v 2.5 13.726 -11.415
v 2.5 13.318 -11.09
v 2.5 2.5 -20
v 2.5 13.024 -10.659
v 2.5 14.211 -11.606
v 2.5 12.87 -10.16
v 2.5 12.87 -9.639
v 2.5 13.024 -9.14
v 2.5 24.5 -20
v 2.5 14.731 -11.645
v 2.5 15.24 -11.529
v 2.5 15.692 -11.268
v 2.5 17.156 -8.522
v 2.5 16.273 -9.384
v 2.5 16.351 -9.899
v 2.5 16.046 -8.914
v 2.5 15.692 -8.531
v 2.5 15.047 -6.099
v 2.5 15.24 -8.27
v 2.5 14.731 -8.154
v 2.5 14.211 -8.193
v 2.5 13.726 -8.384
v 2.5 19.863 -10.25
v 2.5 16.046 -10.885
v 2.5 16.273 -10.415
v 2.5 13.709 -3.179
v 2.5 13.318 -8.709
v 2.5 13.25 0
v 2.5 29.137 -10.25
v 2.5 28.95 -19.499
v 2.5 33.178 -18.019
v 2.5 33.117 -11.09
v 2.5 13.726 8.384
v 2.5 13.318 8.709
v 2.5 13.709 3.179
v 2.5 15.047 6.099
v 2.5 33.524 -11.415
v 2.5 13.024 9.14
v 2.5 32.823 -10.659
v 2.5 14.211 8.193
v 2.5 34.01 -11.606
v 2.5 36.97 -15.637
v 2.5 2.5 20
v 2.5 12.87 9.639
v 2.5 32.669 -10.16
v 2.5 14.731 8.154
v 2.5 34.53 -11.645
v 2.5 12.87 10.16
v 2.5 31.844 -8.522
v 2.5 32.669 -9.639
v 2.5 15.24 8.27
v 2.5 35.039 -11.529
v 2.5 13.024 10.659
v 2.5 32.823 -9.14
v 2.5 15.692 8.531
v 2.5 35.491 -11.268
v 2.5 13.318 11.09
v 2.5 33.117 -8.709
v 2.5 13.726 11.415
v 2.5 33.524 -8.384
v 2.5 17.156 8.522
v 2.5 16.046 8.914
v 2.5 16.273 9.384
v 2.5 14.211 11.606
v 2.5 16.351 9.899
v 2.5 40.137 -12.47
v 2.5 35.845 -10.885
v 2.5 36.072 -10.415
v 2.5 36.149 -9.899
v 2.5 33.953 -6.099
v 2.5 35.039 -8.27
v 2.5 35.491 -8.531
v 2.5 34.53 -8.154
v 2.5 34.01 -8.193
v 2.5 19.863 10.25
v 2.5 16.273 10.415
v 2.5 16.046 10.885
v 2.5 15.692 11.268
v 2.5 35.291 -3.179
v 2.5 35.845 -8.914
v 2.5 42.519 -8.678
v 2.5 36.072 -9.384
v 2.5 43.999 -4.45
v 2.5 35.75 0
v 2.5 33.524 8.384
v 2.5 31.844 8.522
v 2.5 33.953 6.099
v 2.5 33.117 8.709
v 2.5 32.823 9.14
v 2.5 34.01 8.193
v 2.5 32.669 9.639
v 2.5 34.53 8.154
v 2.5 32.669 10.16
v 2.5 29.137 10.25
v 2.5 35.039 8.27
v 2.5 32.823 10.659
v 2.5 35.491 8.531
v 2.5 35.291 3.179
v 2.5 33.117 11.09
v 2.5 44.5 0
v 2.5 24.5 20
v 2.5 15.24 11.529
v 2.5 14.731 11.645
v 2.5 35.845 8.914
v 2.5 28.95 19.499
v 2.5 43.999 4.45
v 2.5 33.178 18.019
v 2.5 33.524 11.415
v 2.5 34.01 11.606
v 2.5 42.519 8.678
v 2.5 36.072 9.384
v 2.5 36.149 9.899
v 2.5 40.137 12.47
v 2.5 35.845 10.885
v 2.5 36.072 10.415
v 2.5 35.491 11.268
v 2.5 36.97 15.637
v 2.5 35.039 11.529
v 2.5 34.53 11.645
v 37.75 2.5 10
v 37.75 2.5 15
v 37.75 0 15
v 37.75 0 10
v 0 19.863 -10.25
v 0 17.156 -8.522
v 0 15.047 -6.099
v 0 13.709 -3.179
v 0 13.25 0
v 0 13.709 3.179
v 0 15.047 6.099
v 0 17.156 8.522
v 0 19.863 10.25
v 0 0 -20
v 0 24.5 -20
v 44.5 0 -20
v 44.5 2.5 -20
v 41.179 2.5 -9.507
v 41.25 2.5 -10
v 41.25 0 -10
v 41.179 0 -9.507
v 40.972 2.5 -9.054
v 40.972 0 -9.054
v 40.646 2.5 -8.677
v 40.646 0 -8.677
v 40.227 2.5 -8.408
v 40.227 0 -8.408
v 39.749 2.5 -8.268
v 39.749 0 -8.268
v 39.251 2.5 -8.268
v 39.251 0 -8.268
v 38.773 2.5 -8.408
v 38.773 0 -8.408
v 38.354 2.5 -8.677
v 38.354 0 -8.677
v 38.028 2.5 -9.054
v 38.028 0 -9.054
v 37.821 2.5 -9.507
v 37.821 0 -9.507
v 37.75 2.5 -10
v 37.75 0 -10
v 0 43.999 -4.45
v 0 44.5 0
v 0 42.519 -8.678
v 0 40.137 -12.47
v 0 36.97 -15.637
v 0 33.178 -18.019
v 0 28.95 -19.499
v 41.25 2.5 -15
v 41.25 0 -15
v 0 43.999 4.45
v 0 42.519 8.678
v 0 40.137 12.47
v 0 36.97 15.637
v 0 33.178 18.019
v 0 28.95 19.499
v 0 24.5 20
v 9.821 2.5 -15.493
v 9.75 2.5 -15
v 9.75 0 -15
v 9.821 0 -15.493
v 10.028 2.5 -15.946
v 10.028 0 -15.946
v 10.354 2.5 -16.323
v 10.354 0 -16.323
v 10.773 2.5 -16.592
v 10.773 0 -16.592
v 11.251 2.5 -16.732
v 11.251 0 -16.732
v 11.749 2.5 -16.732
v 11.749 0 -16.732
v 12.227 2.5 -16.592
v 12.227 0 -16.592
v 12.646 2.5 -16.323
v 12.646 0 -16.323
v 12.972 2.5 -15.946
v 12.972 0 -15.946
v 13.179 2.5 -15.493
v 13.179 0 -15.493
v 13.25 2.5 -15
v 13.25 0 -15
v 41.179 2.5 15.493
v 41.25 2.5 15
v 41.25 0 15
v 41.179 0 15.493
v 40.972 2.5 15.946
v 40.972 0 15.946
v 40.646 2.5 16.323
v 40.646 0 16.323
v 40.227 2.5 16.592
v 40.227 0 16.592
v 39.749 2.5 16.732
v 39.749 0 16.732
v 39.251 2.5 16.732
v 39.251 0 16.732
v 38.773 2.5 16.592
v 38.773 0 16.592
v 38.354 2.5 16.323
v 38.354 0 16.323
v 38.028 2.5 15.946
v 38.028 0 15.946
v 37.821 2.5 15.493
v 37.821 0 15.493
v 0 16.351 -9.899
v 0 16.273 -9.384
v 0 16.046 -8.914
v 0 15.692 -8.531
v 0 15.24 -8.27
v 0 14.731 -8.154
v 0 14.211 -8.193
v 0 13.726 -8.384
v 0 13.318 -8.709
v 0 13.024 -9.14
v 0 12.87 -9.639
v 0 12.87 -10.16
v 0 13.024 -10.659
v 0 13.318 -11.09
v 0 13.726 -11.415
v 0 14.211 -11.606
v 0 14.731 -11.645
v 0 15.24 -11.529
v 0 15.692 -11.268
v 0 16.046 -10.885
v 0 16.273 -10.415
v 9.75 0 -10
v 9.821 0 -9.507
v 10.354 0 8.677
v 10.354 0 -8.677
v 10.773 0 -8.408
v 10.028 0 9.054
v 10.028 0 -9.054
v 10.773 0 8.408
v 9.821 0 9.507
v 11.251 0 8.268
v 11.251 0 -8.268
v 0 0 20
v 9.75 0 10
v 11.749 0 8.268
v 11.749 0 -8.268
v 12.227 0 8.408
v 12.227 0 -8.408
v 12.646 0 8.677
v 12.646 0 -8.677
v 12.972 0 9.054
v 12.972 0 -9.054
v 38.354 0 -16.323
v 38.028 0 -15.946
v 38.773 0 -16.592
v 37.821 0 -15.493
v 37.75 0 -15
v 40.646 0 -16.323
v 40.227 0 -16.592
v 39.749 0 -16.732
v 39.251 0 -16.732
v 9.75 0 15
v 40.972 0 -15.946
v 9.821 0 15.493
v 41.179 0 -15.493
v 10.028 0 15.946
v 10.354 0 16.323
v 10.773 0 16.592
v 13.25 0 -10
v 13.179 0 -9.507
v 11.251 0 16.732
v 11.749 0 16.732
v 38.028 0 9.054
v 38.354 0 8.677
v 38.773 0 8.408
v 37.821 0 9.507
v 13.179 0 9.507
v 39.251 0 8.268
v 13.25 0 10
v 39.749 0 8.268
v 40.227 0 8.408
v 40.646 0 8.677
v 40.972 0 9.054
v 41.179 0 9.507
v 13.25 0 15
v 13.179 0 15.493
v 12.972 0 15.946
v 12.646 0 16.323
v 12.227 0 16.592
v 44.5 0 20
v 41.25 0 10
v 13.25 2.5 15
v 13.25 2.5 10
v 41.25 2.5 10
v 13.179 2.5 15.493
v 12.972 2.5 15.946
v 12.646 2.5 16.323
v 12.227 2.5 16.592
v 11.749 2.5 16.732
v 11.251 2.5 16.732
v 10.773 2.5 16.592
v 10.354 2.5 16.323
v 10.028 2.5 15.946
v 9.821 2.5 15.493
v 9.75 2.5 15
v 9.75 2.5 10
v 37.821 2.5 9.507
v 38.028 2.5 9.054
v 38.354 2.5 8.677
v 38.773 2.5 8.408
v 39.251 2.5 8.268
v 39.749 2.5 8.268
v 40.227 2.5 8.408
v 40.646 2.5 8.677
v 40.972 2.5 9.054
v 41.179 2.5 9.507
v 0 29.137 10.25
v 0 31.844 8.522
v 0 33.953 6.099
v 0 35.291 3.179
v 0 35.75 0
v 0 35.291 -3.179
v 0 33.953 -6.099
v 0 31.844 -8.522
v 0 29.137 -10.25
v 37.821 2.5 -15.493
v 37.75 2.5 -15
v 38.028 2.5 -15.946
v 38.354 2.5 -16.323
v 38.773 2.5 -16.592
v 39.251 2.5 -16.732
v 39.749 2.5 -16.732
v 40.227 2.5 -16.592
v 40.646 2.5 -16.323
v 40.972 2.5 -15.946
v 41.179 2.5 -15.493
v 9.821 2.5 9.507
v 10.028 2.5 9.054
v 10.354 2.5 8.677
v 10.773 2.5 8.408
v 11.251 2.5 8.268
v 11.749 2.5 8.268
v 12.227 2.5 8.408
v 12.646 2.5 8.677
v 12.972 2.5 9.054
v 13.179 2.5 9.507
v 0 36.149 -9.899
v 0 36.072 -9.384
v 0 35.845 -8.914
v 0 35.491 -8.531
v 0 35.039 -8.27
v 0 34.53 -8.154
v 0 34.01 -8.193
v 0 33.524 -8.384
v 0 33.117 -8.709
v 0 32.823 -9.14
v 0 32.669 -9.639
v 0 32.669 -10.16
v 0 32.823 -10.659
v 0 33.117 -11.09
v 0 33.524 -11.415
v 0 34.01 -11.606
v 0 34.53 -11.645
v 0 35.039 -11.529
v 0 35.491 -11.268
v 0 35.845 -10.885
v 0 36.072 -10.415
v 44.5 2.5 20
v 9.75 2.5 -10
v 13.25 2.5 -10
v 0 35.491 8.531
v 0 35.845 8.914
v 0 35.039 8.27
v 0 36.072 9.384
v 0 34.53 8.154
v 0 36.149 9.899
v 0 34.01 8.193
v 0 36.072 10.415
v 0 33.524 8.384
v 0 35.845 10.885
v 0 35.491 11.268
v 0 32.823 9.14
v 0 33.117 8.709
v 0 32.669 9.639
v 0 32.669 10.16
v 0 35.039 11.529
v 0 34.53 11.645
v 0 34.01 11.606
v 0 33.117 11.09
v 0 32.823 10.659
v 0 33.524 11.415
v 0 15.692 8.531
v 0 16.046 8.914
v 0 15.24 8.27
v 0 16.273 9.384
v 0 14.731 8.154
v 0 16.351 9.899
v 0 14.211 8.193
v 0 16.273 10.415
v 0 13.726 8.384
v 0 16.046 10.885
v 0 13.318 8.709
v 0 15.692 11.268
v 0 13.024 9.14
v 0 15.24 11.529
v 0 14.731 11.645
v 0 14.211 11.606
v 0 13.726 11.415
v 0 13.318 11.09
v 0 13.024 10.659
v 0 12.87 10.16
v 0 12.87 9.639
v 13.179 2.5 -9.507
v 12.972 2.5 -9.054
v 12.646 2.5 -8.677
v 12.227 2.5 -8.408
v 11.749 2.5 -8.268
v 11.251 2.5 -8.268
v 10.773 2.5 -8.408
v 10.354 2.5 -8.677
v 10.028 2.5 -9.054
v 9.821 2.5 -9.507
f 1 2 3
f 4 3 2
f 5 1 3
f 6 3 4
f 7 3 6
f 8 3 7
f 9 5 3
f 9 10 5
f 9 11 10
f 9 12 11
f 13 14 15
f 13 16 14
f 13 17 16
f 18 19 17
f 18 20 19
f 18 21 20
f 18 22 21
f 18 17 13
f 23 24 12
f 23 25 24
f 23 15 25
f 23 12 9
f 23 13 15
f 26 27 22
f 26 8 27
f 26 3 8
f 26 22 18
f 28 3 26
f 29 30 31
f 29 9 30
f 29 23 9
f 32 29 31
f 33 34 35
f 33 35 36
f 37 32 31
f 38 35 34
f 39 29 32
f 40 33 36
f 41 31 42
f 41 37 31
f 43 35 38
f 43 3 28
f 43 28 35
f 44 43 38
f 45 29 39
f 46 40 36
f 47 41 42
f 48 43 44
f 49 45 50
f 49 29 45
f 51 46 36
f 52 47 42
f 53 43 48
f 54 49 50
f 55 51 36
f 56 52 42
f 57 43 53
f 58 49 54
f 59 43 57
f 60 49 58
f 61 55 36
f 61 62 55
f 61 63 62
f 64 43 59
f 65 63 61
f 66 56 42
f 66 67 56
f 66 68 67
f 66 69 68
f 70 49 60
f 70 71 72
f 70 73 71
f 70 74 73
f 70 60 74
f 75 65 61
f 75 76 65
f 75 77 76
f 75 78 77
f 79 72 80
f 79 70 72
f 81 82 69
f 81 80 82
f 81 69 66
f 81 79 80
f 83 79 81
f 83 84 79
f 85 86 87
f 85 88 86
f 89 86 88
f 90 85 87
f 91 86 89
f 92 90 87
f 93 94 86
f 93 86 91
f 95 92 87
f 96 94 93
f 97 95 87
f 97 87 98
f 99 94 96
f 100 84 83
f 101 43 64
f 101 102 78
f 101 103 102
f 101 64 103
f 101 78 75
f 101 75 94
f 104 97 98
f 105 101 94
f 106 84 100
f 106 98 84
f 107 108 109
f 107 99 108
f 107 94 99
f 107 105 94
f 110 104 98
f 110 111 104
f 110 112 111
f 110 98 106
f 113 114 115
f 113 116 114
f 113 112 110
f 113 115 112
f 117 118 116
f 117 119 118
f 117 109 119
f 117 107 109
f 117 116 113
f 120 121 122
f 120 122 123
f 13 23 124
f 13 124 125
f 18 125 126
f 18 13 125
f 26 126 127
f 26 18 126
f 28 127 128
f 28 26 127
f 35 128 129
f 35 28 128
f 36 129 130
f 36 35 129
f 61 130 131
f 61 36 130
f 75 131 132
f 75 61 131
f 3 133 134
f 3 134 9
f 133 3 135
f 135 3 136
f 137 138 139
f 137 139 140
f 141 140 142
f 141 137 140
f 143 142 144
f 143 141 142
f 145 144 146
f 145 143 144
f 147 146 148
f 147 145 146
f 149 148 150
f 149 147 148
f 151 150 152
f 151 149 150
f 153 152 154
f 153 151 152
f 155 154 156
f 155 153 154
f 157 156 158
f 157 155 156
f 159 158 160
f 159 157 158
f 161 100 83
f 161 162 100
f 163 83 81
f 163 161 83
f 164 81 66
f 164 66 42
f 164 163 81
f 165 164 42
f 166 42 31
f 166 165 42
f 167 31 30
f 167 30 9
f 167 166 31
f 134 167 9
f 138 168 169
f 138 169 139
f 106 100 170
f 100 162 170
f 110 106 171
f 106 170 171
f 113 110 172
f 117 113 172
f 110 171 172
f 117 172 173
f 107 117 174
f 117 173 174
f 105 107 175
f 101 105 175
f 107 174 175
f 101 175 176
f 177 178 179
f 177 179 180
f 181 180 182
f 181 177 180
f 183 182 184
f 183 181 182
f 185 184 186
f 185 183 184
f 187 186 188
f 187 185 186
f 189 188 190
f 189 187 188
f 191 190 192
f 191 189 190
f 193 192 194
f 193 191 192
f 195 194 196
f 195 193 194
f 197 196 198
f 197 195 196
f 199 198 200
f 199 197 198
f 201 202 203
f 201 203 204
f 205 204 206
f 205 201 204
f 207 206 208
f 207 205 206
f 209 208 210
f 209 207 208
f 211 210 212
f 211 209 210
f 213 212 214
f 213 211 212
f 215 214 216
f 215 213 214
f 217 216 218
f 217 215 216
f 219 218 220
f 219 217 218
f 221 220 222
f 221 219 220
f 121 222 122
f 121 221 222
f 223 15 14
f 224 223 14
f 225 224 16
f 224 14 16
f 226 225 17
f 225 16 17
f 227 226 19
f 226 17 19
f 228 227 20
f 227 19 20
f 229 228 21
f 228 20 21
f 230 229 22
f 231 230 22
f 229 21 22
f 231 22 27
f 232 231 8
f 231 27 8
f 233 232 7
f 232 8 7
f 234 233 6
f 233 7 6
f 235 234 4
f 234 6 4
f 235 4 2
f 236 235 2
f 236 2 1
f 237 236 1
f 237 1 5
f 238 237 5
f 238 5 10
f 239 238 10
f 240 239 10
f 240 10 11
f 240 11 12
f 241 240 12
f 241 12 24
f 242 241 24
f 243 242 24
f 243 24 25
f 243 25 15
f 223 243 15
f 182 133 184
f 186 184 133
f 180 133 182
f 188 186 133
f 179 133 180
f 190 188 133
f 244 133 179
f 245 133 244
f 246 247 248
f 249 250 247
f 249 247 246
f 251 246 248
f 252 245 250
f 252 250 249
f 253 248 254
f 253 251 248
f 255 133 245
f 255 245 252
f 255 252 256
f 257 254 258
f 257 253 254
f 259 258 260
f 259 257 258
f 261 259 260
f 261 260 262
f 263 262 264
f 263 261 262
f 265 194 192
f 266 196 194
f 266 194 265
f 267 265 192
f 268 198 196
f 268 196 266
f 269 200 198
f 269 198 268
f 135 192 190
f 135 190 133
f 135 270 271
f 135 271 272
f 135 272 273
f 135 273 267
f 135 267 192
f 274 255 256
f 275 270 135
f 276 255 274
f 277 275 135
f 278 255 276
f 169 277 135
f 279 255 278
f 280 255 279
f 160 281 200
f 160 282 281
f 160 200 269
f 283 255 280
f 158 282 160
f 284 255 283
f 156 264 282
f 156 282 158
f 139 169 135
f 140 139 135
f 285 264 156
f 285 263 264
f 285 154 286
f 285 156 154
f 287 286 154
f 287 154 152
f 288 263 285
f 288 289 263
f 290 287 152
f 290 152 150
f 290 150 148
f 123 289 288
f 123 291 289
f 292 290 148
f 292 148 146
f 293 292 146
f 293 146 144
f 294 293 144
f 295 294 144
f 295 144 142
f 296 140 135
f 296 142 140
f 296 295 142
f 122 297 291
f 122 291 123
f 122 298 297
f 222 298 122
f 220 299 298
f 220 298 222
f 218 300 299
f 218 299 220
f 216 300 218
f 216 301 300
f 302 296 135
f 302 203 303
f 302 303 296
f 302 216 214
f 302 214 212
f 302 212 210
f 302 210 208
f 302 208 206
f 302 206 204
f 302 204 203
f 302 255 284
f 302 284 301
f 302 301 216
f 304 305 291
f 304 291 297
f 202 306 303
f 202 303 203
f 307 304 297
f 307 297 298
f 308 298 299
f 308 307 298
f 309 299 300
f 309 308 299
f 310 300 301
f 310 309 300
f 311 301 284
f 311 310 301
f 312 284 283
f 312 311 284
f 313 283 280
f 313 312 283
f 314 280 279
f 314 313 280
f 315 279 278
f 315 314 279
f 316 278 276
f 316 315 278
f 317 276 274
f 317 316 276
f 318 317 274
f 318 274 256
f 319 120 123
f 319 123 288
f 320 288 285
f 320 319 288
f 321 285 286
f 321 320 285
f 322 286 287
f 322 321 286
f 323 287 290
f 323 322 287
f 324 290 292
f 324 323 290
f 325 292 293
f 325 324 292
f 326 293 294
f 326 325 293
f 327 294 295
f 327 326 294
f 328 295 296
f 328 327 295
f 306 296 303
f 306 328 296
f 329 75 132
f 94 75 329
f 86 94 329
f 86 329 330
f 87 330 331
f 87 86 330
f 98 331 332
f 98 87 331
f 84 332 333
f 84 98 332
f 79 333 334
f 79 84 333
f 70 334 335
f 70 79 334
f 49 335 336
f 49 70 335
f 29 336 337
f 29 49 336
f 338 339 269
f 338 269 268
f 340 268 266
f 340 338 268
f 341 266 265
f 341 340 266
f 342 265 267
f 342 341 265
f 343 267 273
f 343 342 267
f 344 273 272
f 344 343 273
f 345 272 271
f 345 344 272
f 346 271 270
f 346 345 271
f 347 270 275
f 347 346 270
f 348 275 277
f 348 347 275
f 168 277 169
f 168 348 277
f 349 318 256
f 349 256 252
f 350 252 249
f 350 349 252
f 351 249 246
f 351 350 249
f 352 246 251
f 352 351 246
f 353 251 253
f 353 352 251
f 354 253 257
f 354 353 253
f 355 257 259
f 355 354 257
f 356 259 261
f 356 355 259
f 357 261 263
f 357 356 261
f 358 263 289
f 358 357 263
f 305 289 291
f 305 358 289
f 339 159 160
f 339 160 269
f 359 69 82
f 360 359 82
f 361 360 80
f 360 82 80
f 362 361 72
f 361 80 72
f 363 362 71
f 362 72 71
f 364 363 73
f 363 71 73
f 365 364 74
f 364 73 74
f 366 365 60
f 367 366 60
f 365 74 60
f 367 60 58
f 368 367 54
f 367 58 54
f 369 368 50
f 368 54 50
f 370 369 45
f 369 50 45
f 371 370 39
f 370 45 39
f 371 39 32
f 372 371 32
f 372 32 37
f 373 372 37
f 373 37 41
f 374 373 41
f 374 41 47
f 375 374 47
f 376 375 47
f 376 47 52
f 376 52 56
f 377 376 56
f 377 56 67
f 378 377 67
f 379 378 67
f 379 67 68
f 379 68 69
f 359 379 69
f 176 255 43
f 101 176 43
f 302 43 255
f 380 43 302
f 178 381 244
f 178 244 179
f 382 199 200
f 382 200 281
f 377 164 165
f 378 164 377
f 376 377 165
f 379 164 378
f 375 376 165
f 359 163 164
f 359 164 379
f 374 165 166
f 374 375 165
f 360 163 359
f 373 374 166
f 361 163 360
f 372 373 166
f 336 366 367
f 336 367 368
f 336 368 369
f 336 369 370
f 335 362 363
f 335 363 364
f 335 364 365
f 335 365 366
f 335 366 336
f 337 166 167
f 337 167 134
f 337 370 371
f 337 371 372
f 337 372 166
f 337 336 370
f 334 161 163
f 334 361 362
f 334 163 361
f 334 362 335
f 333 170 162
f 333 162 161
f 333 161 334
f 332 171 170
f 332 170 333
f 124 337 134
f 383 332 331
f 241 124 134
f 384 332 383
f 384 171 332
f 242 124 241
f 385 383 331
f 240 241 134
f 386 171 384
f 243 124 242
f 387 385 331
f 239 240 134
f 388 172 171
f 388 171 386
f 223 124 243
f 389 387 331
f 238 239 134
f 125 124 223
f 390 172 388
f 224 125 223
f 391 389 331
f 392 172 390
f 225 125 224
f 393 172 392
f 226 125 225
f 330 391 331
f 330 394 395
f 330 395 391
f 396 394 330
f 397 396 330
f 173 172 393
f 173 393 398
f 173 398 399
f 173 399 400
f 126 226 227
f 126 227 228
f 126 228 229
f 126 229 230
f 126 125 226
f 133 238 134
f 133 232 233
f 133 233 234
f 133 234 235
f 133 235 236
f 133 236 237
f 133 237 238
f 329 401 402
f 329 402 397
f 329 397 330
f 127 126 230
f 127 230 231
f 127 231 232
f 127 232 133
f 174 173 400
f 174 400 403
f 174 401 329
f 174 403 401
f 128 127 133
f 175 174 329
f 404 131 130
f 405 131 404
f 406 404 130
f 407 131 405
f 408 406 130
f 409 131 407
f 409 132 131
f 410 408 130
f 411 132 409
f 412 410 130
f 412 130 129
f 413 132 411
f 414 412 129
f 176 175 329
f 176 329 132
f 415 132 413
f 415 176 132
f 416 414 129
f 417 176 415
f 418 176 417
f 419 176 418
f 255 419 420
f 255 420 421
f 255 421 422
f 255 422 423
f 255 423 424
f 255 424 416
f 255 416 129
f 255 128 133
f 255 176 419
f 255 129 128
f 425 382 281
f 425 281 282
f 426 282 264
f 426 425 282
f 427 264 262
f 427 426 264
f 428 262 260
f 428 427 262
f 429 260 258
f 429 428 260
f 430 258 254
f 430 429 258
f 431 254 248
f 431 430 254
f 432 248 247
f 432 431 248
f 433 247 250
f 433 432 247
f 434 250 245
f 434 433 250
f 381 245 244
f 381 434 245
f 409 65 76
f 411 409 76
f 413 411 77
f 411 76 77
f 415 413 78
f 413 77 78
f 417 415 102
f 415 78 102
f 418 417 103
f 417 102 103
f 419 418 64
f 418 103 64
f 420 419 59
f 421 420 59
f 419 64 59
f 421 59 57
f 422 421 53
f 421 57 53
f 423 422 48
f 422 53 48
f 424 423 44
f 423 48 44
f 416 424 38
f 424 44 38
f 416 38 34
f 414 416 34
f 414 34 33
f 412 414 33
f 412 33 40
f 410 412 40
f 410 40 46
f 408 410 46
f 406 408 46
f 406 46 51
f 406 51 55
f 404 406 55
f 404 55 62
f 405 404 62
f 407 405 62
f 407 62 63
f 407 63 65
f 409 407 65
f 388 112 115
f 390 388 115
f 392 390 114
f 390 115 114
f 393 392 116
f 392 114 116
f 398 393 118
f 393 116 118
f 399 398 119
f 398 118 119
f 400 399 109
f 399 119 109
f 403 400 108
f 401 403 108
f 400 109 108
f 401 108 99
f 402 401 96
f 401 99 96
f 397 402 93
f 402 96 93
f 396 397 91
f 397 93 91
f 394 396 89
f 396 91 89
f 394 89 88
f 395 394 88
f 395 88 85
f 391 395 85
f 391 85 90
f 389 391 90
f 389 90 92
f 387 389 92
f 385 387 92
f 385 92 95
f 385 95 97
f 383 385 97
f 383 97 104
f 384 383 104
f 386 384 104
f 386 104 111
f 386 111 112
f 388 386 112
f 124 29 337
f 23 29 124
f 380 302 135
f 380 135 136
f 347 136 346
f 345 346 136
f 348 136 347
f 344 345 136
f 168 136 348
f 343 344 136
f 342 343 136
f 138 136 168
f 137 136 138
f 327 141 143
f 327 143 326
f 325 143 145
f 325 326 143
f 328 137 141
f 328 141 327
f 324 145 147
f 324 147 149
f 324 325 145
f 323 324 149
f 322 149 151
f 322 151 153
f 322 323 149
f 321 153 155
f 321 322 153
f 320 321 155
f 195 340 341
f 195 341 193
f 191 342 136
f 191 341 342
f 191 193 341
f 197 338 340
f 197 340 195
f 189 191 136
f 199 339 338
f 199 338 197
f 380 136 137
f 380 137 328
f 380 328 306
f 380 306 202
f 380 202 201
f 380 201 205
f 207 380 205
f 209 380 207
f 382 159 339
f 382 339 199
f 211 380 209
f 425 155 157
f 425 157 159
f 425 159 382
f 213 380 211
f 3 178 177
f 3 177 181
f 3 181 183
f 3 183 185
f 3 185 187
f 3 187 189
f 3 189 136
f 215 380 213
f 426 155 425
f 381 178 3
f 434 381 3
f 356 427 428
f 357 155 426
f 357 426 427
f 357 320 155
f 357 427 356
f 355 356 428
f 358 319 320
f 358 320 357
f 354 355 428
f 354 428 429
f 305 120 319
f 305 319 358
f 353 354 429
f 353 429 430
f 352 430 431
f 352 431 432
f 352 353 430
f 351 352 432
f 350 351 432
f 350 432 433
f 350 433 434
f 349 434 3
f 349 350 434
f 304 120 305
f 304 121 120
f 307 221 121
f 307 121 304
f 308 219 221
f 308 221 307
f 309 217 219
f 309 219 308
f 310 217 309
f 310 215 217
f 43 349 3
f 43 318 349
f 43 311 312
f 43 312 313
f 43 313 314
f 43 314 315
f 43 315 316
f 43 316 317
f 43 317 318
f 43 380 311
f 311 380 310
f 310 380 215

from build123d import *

# Parameters (mm, degrees)
BOSS_EXTRUDE1_DEPTH = 20
FILLET1_R           = 20
CUT_EXTRUDE1_REACH  = 66.376
SKETCH2_R           = 1.75
CUT_EXTRUDE2_REACH  = 66.376


with BuildPart() as part:
    # Sketch1 → Boss-Extrude1 (new, symmetric)
    with BuildSketch(Plane.XY):
        Polygon((0, 44.5), (0, 0), (44.5, 0), (44.5, 2.5), (2.5, 2.5), (2.5, 44.5), align=None)
    extrude(amount=BOSS_EXTRUDE1_DEPTH, both=True)

    # Fillet1
    fillet1_edges = [part.edges().sort_by_distance(p)[0] for p in [
        (1.25, 44.5, -20),
        (1.25, 44.5, 20),
    ]]
    fillet(fillet1_edges, radius=FILLET1_R - 0.0001)  # a hair under: the kernel refuses the full size

    # Sketch2 → Cut-Extrude1 (cut, up to next)
    with BuildSketch(Plane(origin=(2.5, 0, 0), x_dir=(0, 0, -1), z_dir=(1, 0, 0)), mode=Mode.PRIVATE) as cut_extrude1_sk1:
        with Locations(Location((9.899494937, 14.600505063, 0), (0, 0, 90))):
            Circle(SKETCH2_R)
    cut_extrude1_tool1 = extrude(cut_extrude1_sk1.sketch, amount=-CUT_EXTRUDE1_REACH, mode=Mode.PRIVATE) & part.part
    # Sketch2 → Cut-Extrude1 (cut, up to next)
    with BuildSketch(Plane(origin=(2.5, 0, 0), x_dir=(0, 0, -1), z_dir=(1, 0, 0)), mode=Mode.PRIVATE) as cut_extrude1_sk2:
        with Locations(Location((-9.899494937, 14.600505063, 0), (0, 0, 90))):
            Circle(SKETCH2_R)
    cut_extrude1_tool2 = extrude(cut_extrude1_sk2.sketch, amount=-CUT_EXTRUDE1_REACH, mode=Mode.PRIVATE) & part.part
    # Sketch2 → Cut-Extrude1 (cut, up to next)
    with BuildSketch(Plane(origin=(2.5, 0, 0), x_dir=(0, 0, -1), z_dir=(1, 0, 0)), mode=Mode.PRIVATE) as cut_extrude1_sk3:
        with Locations(Location((-9.899494937, 34.399494937, 0), (0, 0, 90))):
            Circle(SKETCH2_R)
    cut_extrude1_tool3 = extrude(cut_extrude1_sk3.sketch, amount=-CUT_EXTRUDE1_REACH, mode=Mode.PRIVATE) & part.part
    # Sketch2 → Cut-Extrude1 (cut, up to next)
    with BuildSketch(Plane(origin=(2.5, 0, 0), x_dir=(0, 0, -1), z_dir=(1, 0, 0)), mode=Mode.PRIVATE) as cut_extrude1_sk4:
        with Locations(Location((9.899494937, 34.399494937, 0), (0, 0, 90))):
            Circle(SKETCH2_R)
    cut_extrude1_tool4 = extrude(cut_extrude1_sk4.sketch, amount=-CUT_EXTRUDE1_REACH, mode=Mode.PRIVATE) & part.part
    # Sketch2 → Cut-Extrude1 (cut, up to next)
    with BuildSketch(Plane(origin=(2.5, 0, 0), x_dir=(0, 0, -1), z_dir=(1, 0, 0)), mode=Mode.PRIVATE) as cut_extrude1_sk5:
        with BuildLine():
            Line((10.25, 29.136809248), (10.25, 19.863190752))
            ThreePointArc((10.25, 19.863190752), (0, 13.25), (-10.25, 19.863190752))
            Line((-10.25, 19.863190752), (-10.25, 29.136809248))
            ThreePointArc((-10.25, 29.136809248), (0, 35.75), (10.25, 29.136809248))
        make_face()
    cut_extrude1_tool5 = extrude(cut_extrude1_sk5.sketch, amount=-CUT_EXTRUDE1_REACH, mode=Mode.PRIVATE) & part.part
    add(cut_extrude1_tool1.solids().sort_by_distance((2.5, 14.600505, -9.899495))[0], mode=Mode.SUBTRACT)
    add(cut_extrude1_tool2.solids().sort_by_distance((2.5, 14.600505, 9.899495))[0], mode=Mode.SUBTRACT)
    add(cut_extrude1_tool3.solids().sort_by_distance((2.5, 34.399495, 9.899495))[0], mode=Mode.SUBTRACT)
    add(cut_extrude1_tool4.solids().sort_by_distance((2.5, 34.399495, -9.899495))[0], mode=Mode.SUBTRACT)
    add(cut_extrude1_tool5.solids().sort_by_distance((2.5, 24.5, 0))[0], mode=Mode.SUBTRACT)

    # Sketch3 → Cut-Extrude2 (cut, up to next)
    with BuildSketch(Plane(origin=(0, 2.5, 0), x_dir=(1, 0, 0), z_dir=(0, 1, 0)), mode=Mode.PRIVATE) as cut_extrude2_sk1:
        with BuildLine():
            Line((13.25, -10), (13.25, -15))
            ThreePointArc((13.25, -15), (11.5, -16.75), (9.75, -15))
            Line((9.75, -15), (9.75, -10))
            ThreePointArc((9.75, -10), (11.5, -8.25), (13.25, -10))
        make_face()
    cut_extrude2_tool1 = extrude(cut_extrude2_sk1.sketch, amount=-CUT_EXTRUDE2_REACH, mode=Mode.PRIVATE) & part.part
    # Sketch3 → Cut-Extrude2 (cut, up to next)
    with BuildSketch(Plane(origin=(0, 2.5, 0), x_dir=(1, 0, 0), z_dir=(0, 1, 0)), mode=Mode.PRIVATE) as cut_extrude2_sk2:
        with BuildLine():
            Line((41.25, -10), (41.25, -15))
            ThreePointArc((41.25, -15), (39.5, -16.75), (37.75, -15))
            Line((37.75, -15), (37.75, -10))
            ThreePointArc((37.75, -10), (39.5, -8.25), (41.25, -10))
        make_face()
    cut_extrude2_tool2 = extrude(cut_extrude2_sk2.sketch, amount=-CUT_EXTRUDE2_REACH, mode=Mode.PRIVATE) & part.part
    # Sketch3 → Cut-Extrude2 (cut, up to next)
    with BuildSketch(Plane(origin=(0, 2.5, 0), x_dir=(1, 0, 0), z_dir=(0, 1, 0)), mode=Mode.PRIVATE) as cut_extrude2_sk3:
        with BuildLine():
            Line((13.25, 15), (13.25, 10))
            ThreePointArc((13.25, 10), (11.5, 8.25), (9.75, 10))
            Line((9.75, 10), (9.75, 15))
            ThreePointArc((9.75, 15), (11.5, 16.75), (13.25, 15))
        make_face()
    cut_extrude2_tool3 = extrude(cut_extrude2_sk3.sketch, amount=-CUT_EXTRUDE2_REACH, mode=Mode.PRIVATE) & part.part
    # Sketch3 → Cut-Extrude2 (cut, up to next)
    with BuildSketch(Plane(origin=(0, 2.5, 0), x_dir=(1, 0, 0), z_dir=(0, 1, 0)), mode=Mode.PRIVATE) as cut_extrude2_sk4:
        with BuildLine():
            Line((41.25, 15), (41.25, 10))
            ThreePointArc((41.25, 10), (39.5, 8.25), (37.75, 10))
            Line((37.75, 10), (37.75, 15))
            ThreePointArc((37.75, 15), (39.5, 16.75), (41.25, 15))
        make_face()
    cut_extrude2_tool4 = extrude(cut_extrude2_sk4.sketch, amount=-CUT_EXTRUDE2_REACH, mode=Mode.PRIVATE) & part.part
    add(cut_extrude2_tool1.solids().sort_by_distance((11.5, 2.5, 12.5))[0], mode=Mode.SUBTRACT)
    add(cut_extrude2_tool2.solids().sort_by_distance((39.5, 2.5, 12.5))[0], mode=Mode.SUBTRACT)
    add(cut_extrude2_tool3.solids().sort_by_distance((11.5, 2.5, -12.5))[0], mode=Mode.SUBTRACT)
    add(cut_extrude2_tool4.solids().sort_by_distance((39.5, 2.5, -12.5))[0], mode=Mode.SUBTRACT)


solid = part.part
